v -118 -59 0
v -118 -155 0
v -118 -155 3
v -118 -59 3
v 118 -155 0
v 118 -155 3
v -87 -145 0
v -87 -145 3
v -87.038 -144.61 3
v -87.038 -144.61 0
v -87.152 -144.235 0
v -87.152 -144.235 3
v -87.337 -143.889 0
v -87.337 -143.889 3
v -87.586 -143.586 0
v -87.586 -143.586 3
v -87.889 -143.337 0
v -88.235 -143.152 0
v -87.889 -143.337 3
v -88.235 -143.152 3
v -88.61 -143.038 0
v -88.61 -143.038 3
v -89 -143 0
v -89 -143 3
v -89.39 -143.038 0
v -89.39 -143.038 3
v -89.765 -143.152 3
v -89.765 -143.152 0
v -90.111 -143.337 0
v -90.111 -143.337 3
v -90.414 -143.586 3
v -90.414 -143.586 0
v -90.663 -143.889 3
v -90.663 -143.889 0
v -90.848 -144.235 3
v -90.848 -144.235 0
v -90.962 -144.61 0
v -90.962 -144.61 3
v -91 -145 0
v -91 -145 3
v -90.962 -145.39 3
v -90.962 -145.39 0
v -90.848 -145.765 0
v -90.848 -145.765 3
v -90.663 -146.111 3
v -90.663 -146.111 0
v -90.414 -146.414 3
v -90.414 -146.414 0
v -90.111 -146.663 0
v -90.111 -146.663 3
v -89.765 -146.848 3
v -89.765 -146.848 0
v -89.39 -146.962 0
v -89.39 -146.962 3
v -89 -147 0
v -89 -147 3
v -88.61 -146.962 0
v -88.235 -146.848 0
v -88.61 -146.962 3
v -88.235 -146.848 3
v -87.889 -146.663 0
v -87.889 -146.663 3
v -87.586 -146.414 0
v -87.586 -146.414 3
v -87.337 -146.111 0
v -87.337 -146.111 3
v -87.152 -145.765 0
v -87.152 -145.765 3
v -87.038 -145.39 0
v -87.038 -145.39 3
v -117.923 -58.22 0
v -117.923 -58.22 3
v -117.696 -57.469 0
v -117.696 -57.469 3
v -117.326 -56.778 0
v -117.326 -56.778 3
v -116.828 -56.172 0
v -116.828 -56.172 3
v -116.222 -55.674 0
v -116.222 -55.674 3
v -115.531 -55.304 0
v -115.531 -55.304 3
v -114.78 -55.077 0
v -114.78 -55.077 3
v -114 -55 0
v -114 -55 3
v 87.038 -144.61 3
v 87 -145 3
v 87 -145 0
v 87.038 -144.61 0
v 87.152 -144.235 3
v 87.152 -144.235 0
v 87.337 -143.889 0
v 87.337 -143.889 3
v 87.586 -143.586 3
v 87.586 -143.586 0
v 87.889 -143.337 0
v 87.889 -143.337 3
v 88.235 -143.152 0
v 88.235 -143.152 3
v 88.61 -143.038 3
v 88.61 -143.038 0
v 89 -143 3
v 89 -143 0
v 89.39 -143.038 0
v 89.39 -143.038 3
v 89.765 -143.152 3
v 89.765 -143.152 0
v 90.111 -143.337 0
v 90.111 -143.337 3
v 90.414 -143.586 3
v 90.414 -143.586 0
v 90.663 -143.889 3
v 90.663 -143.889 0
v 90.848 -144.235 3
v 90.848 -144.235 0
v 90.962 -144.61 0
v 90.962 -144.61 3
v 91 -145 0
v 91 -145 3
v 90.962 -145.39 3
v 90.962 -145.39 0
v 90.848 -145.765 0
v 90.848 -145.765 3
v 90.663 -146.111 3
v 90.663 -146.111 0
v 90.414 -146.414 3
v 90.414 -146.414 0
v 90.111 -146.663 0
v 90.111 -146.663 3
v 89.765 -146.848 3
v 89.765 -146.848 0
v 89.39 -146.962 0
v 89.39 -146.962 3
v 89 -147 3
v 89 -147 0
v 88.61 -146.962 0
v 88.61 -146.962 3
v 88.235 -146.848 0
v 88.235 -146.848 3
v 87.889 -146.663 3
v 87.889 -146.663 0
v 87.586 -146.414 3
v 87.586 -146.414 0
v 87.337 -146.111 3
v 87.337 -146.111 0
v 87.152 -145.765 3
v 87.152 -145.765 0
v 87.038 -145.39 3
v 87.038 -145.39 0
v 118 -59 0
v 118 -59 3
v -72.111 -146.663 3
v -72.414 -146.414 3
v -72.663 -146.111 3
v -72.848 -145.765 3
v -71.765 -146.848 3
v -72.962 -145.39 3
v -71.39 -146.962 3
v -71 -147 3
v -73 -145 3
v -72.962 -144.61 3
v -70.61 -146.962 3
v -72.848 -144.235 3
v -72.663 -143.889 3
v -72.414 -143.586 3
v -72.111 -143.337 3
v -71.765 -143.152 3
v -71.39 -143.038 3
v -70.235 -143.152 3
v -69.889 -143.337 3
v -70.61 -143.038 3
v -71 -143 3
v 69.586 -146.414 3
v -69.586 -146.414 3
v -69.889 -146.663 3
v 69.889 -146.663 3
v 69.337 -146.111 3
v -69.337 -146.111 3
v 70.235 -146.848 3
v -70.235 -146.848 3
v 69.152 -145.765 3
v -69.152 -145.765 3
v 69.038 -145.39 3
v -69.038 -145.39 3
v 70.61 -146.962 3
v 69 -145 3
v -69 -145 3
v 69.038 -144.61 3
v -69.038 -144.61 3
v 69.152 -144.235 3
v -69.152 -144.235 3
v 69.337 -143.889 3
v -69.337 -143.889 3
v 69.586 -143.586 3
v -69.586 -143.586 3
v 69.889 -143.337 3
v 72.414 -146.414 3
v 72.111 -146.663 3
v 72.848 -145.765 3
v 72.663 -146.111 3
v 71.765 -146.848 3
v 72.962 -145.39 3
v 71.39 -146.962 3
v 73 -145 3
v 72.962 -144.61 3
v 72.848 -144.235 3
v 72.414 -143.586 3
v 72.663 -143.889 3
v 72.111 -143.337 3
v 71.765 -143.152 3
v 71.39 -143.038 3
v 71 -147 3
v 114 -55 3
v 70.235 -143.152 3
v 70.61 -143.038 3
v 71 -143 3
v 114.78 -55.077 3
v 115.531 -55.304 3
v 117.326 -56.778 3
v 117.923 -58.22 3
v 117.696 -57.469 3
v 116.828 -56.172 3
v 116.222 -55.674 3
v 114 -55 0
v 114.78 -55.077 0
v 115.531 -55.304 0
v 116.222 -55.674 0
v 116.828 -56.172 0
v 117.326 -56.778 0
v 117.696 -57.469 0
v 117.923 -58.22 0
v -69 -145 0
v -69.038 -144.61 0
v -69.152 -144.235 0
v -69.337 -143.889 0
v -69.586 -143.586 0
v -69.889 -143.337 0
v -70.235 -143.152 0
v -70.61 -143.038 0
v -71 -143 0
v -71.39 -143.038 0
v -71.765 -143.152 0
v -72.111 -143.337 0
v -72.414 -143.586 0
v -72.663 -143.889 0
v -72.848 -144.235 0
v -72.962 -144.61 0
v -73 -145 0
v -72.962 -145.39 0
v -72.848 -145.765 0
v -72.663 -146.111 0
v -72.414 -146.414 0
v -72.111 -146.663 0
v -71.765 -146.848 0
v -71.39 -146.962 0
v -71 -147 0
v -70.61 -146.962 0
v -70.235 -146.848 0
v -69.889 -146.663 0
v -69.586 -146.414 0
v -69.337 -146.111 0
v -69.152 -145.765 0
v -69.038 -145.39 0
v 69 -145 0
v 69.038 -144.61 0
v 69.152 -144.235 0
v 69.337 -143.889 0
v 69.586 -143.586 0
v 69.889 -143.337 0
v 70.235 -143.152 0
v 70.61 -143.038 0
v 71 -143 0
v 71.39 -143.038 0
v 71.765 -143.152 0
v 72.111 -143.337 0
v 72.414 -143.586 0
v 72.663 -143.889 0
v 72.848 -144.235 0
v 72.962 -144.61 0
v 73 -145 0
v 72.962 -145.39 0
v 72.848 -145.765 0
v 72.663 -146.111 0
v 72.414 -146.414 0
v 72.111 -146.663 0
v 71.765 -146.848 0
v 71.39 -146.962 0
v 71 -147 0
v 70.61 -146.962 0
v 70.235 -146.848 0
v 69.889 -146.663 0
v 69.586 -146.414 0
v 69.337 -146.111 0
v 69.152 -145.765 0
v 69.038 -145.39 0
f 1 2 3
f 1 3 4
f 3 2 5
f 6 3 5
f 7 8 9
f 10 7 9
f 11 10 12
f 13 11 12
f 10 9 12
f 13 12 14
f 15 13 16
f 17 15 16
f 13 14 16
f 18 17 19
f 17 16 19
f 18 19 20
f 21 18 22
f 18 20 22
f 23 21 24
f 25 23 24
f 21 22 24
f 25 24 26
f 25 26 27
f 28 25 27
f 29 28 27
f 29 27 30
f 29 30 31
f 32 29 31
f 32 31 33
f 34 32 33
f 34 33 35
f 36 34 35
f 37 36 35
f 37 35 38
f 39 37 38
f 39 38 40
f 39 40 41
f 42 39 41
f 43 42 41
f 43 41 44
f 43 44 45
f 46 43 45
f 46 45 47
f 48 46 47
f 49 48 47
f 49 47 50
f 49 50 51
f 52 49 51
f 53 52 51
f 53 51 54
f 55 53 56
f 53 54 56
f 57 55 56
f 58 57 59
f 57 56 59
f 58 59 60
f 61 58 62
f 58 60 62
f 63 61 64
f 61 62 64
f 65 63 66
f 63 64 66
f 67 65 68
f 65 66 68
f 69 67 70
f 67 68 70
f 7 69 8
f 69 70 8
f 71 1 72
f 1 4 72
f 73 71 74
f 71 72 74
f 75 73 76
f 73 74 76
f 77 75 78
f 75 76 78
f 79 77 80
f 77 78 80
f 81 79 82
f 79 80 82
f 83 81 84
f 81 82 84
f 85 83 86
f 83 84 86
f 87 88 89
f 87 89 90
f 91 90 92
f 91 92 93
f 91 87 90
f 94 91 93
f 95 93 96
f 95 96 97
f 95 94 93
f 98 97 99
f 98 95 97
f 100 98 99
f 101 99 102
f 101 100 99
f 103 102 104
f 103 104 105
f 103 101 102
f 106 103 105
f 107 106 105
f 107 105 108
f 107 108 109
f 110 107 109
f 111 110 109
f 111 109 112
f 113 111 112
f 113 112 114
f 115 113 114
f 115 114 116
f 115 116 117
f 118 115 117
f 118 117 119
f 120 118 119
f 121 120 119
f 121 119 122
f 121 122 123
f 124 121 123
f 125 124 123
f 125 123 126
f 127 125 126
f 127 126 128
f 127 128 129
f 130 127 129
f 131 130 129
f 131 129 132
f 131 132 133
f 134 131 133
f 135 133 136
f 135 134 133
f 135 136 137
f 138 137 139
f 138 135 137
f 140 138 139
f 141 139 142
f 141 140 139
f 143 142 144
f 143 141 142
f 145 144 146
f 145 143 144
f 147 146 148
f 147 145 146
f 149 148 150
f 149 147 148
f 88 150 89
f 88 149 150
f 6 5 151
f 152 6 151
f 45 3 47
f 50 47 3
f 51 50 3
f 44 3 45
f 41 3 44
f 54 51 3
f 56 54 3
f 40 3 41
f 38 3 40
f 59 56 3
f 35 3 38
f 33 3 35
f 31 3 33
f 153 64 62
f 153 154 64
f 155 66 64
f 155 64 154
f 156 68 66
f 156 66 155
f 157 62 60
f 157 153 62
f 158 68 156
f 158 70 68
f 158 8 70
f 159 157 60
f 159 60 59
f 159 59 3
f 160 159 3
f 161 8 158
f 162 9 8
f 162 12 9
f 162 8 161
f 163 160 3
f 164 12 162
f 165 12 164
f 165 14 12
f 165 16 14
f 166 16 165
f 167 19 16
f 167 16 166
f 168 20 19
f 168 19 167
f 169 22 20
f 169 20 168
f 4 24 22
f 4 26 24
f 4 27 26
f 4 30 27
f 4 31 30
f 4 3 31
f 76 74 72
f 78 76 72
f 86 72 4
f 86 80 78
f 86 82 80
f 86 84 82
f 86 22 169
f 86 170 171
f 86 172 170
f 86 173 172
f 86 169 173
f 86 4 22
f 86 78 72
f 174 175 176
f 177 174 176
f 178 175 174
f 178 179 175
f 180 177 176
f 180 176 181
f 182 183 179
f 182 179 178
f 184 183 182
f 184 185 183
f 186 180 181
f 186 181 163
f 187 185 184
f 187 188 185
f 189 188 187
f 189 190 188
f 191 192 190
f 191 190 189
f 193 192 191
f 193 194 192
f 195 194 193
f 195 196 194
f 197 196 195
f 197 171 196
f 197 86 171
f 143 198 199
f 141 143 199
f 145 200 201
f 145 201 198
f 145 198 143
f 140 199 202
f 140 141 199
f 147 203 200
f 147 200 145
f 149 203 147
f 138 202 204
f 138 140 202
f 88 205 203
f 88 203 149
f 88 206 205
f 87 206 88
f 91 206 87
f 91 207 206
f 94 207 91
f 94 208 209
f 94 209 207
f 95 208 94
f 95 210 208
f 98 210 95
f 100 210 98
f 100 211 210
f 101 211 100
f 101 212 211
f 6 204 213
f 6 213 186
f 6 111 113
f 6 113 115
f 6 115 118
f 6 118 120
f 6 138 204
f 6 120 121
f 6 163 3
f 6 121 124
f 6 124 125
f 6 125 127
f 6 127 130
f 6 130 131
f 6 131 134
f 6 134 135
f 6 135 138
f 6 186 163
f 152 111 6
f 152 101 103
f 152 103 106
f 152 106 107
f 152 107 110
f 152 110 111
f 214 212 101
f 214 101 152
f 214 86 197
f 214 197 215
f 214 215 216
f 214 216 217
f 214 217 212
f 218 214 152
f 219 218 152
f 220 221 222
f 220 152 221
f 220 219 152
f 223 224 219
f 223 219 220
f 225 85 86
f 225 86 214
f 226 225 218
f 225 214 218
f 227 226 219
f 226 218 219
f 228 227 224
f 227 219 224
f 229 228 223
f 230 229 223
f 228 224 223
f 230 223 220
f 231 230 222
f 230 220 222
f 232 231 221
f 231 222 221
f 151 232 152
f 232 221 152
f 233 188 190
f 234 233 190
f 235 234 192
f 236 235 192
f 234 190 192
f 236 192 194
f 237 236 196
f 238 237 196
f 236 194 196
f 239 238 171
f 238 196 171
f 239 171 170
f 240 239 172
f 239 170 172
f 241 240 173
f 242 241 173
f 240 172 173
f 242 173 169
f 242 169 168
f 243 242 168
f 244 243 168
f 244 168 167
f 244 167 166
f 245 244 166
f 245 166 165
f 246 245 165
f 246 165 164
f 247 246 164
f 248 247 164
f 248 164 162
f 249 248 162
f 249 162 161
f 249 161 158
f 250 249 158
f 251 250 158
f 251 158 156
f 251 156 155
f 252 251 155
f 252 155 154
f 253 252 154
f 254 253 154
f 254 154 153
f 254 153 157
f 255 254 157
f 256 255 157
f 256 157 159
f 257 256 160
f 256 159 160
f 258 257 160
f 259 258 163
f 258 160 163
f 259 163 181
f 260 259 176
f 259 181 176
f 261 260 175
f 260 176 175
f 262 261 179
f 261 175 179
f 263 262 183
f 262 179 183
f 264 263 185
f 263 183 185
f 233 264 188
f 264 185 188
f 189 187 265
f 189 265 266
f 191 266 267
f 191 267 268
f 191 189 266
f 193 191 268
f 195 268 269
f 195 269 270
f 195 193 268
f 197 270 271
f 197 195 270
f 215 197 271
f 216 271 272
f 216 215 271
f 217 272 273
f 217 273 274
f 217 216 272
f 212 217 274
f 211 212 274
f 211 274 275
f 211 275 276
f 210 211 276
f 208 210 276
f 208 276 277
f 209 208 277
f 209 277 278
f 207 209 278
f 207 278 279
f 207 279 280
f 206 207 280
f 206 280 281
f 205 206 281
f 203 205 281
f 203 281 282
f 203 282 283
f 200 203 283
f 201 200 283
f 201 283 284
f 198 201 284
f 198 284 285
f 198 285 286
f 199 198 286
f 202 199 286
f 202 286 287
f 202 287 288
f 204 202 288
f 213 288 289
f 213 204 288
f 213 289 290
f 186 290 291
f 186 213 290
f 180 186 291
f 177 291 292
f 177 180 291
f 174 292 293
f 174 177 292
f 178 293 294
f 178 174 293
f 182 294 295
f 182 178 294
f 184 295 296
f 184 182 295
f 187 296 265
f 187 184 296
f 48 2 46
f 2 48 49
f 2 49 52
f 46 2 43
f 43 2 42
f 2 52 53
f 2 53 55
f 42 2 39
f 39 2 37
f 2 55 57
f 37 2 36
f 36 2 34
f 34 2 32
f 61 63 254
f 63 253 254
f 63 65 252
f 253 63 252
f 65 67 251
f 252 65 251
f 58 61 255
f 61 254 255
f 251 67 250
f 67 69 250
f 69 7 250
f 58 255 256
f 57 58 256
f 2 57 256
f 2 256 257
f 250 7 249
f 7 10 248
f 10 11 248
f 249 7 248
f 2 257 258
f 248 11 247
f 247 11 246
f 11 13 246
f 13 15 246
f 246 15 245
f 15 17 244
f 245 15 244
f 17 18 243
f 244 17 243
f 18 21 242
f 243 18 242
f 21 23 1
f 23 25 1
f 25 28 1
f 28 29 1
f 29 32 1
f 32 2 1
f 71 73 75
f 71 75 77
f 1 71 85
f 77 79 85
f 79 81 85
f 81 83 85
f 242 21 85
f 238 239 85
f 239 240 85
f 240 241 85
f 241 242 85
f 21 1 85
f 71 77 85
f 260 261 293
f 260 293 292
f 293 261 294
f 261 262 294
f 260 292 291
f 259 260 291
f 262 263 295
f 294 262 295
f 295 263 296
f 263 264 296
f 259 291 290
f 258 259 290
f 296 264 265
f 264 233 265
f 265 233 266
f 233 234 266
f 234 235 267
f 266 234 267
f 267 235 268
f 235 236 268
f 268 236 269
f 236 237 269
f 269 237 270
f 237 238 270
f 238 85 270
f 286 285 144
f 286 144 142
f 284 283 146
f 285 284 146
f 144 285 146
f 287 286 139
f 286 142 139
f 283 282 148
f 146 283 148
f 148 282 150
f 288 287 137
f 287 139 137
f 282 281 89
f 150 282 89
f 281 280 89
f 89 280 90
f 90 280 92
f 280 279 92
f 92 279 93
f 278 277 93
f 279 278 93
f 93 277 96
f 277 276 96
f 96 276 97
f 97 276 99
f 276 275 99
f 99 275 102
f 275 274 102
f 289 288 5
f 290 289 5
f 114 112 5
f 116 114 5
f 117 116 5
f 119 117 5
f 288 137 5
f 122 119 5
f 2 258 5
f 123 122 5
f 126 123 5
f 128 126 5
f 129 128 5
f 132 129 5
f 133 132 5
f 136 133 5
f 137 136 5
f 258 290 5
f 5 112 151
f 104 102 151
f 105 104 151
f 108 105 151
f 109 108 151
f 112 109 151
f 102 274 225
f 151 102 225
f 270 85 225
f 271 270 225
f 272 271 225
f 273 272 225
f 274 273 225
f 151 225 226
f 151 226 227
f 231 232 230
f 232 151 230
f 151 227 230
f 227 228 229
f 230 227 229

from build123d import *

# Parameters (mm, degrees)
ESQUISSE1_W             = 236
ESQUISSE1_H             = 100
BOSS_EXTRU_1_DEPTH      = 3
ENL_V_MAT_EXTRU_1_REACH = 196.828
ESQUISSE3_R             = 2
CONG_1_R                = 4


with BuildPart() as part:
    # Esquisse1 → Boss.-Extru.1 (new body)
    with BuildSketch(Plane.XY):
        with Locations((0, -105)):
            Rectangle(ESQUISSE1_W, ESQUISSE1_H)
    extrude(amount=BOSS_EXTRU_1_DEPTH)

    # Esquisse3 → Enlèv. mat.-Extru.1 (cut, up to next)
    with BuildSketch(Plane.XY.offset(3), mode=Mode.PRIVATE) as enl_v_mat_extru_1_sk1:
        with Locations((-71, -145)):
            Circle(ESQUISSE3_R)
    enl_v_mat_extru_1_tool1 = extrude(enl_v_mat_extru_1_sk1.sketch, amount=-ENL_V_MAT_EXTRU_1_REACH, mode=Mode.PRIVATE) & part.part
    # Esquisse3 → Enlèv. mat.-Extru.1 (cut, up to next)
    with BuildSketch(Plane.XY.offset(3), mode=Mode.PRIVATE) as enl_v_mat_extru_1_sk2:
        with Locations((-89, -145)):
            Circle(ESQUISSE3_R)
    enl_v_mat_extru_1_tool2 = extrude(enl_v_mat_extru_1_sk2.sketch, amount=-ENL_V_MAT_EXTRU_1_REACH, mode=Mode.PRIVATE) & part.part
    enl_v_mat_extru_1_1 = enl_v_mat_extru_1_tool1.solids().sort_by_distance((-71, -145, 3))[0]
    add(enl_v_mat_extru_1_1, mode=Mode.SUBTRACT)
    enl_v_mat_extru_1_2 = enl_v_mat_extru_1_tool2.solids().sort_by_distance((-89, -145, 3))[0]
    add(enl_v_mat_extru_1_2, mode=Mode.SUBTRACT)
    enl_v_mat_extru_1 = enl_v_mat_extru_1_1 + enl_v_mat_extru_1_2  # Enlèv. mat.-Extru.1 as one shape, for the pattern or mirror that repeats it

    # Symétrie1: Enlèv. mat.-Extru.1 across plane
    add(enl_v_mat_extru_1.mirror(Plane(origin=(0, 0, 0), x_dir=(0, 0, 1), z_dir=(1, 0, 0))), mode=Mode.SUBTRACT)

    # Congé1
    cong_1_edges = [part.edges().sort_by_distance(p)[0] for p in [
        (-118, -55, 1.5),
        (118, -55, 1.5),
    ]]
    fillet(cong_1_edges, radius=CONG_1_R)


solid = part.part
